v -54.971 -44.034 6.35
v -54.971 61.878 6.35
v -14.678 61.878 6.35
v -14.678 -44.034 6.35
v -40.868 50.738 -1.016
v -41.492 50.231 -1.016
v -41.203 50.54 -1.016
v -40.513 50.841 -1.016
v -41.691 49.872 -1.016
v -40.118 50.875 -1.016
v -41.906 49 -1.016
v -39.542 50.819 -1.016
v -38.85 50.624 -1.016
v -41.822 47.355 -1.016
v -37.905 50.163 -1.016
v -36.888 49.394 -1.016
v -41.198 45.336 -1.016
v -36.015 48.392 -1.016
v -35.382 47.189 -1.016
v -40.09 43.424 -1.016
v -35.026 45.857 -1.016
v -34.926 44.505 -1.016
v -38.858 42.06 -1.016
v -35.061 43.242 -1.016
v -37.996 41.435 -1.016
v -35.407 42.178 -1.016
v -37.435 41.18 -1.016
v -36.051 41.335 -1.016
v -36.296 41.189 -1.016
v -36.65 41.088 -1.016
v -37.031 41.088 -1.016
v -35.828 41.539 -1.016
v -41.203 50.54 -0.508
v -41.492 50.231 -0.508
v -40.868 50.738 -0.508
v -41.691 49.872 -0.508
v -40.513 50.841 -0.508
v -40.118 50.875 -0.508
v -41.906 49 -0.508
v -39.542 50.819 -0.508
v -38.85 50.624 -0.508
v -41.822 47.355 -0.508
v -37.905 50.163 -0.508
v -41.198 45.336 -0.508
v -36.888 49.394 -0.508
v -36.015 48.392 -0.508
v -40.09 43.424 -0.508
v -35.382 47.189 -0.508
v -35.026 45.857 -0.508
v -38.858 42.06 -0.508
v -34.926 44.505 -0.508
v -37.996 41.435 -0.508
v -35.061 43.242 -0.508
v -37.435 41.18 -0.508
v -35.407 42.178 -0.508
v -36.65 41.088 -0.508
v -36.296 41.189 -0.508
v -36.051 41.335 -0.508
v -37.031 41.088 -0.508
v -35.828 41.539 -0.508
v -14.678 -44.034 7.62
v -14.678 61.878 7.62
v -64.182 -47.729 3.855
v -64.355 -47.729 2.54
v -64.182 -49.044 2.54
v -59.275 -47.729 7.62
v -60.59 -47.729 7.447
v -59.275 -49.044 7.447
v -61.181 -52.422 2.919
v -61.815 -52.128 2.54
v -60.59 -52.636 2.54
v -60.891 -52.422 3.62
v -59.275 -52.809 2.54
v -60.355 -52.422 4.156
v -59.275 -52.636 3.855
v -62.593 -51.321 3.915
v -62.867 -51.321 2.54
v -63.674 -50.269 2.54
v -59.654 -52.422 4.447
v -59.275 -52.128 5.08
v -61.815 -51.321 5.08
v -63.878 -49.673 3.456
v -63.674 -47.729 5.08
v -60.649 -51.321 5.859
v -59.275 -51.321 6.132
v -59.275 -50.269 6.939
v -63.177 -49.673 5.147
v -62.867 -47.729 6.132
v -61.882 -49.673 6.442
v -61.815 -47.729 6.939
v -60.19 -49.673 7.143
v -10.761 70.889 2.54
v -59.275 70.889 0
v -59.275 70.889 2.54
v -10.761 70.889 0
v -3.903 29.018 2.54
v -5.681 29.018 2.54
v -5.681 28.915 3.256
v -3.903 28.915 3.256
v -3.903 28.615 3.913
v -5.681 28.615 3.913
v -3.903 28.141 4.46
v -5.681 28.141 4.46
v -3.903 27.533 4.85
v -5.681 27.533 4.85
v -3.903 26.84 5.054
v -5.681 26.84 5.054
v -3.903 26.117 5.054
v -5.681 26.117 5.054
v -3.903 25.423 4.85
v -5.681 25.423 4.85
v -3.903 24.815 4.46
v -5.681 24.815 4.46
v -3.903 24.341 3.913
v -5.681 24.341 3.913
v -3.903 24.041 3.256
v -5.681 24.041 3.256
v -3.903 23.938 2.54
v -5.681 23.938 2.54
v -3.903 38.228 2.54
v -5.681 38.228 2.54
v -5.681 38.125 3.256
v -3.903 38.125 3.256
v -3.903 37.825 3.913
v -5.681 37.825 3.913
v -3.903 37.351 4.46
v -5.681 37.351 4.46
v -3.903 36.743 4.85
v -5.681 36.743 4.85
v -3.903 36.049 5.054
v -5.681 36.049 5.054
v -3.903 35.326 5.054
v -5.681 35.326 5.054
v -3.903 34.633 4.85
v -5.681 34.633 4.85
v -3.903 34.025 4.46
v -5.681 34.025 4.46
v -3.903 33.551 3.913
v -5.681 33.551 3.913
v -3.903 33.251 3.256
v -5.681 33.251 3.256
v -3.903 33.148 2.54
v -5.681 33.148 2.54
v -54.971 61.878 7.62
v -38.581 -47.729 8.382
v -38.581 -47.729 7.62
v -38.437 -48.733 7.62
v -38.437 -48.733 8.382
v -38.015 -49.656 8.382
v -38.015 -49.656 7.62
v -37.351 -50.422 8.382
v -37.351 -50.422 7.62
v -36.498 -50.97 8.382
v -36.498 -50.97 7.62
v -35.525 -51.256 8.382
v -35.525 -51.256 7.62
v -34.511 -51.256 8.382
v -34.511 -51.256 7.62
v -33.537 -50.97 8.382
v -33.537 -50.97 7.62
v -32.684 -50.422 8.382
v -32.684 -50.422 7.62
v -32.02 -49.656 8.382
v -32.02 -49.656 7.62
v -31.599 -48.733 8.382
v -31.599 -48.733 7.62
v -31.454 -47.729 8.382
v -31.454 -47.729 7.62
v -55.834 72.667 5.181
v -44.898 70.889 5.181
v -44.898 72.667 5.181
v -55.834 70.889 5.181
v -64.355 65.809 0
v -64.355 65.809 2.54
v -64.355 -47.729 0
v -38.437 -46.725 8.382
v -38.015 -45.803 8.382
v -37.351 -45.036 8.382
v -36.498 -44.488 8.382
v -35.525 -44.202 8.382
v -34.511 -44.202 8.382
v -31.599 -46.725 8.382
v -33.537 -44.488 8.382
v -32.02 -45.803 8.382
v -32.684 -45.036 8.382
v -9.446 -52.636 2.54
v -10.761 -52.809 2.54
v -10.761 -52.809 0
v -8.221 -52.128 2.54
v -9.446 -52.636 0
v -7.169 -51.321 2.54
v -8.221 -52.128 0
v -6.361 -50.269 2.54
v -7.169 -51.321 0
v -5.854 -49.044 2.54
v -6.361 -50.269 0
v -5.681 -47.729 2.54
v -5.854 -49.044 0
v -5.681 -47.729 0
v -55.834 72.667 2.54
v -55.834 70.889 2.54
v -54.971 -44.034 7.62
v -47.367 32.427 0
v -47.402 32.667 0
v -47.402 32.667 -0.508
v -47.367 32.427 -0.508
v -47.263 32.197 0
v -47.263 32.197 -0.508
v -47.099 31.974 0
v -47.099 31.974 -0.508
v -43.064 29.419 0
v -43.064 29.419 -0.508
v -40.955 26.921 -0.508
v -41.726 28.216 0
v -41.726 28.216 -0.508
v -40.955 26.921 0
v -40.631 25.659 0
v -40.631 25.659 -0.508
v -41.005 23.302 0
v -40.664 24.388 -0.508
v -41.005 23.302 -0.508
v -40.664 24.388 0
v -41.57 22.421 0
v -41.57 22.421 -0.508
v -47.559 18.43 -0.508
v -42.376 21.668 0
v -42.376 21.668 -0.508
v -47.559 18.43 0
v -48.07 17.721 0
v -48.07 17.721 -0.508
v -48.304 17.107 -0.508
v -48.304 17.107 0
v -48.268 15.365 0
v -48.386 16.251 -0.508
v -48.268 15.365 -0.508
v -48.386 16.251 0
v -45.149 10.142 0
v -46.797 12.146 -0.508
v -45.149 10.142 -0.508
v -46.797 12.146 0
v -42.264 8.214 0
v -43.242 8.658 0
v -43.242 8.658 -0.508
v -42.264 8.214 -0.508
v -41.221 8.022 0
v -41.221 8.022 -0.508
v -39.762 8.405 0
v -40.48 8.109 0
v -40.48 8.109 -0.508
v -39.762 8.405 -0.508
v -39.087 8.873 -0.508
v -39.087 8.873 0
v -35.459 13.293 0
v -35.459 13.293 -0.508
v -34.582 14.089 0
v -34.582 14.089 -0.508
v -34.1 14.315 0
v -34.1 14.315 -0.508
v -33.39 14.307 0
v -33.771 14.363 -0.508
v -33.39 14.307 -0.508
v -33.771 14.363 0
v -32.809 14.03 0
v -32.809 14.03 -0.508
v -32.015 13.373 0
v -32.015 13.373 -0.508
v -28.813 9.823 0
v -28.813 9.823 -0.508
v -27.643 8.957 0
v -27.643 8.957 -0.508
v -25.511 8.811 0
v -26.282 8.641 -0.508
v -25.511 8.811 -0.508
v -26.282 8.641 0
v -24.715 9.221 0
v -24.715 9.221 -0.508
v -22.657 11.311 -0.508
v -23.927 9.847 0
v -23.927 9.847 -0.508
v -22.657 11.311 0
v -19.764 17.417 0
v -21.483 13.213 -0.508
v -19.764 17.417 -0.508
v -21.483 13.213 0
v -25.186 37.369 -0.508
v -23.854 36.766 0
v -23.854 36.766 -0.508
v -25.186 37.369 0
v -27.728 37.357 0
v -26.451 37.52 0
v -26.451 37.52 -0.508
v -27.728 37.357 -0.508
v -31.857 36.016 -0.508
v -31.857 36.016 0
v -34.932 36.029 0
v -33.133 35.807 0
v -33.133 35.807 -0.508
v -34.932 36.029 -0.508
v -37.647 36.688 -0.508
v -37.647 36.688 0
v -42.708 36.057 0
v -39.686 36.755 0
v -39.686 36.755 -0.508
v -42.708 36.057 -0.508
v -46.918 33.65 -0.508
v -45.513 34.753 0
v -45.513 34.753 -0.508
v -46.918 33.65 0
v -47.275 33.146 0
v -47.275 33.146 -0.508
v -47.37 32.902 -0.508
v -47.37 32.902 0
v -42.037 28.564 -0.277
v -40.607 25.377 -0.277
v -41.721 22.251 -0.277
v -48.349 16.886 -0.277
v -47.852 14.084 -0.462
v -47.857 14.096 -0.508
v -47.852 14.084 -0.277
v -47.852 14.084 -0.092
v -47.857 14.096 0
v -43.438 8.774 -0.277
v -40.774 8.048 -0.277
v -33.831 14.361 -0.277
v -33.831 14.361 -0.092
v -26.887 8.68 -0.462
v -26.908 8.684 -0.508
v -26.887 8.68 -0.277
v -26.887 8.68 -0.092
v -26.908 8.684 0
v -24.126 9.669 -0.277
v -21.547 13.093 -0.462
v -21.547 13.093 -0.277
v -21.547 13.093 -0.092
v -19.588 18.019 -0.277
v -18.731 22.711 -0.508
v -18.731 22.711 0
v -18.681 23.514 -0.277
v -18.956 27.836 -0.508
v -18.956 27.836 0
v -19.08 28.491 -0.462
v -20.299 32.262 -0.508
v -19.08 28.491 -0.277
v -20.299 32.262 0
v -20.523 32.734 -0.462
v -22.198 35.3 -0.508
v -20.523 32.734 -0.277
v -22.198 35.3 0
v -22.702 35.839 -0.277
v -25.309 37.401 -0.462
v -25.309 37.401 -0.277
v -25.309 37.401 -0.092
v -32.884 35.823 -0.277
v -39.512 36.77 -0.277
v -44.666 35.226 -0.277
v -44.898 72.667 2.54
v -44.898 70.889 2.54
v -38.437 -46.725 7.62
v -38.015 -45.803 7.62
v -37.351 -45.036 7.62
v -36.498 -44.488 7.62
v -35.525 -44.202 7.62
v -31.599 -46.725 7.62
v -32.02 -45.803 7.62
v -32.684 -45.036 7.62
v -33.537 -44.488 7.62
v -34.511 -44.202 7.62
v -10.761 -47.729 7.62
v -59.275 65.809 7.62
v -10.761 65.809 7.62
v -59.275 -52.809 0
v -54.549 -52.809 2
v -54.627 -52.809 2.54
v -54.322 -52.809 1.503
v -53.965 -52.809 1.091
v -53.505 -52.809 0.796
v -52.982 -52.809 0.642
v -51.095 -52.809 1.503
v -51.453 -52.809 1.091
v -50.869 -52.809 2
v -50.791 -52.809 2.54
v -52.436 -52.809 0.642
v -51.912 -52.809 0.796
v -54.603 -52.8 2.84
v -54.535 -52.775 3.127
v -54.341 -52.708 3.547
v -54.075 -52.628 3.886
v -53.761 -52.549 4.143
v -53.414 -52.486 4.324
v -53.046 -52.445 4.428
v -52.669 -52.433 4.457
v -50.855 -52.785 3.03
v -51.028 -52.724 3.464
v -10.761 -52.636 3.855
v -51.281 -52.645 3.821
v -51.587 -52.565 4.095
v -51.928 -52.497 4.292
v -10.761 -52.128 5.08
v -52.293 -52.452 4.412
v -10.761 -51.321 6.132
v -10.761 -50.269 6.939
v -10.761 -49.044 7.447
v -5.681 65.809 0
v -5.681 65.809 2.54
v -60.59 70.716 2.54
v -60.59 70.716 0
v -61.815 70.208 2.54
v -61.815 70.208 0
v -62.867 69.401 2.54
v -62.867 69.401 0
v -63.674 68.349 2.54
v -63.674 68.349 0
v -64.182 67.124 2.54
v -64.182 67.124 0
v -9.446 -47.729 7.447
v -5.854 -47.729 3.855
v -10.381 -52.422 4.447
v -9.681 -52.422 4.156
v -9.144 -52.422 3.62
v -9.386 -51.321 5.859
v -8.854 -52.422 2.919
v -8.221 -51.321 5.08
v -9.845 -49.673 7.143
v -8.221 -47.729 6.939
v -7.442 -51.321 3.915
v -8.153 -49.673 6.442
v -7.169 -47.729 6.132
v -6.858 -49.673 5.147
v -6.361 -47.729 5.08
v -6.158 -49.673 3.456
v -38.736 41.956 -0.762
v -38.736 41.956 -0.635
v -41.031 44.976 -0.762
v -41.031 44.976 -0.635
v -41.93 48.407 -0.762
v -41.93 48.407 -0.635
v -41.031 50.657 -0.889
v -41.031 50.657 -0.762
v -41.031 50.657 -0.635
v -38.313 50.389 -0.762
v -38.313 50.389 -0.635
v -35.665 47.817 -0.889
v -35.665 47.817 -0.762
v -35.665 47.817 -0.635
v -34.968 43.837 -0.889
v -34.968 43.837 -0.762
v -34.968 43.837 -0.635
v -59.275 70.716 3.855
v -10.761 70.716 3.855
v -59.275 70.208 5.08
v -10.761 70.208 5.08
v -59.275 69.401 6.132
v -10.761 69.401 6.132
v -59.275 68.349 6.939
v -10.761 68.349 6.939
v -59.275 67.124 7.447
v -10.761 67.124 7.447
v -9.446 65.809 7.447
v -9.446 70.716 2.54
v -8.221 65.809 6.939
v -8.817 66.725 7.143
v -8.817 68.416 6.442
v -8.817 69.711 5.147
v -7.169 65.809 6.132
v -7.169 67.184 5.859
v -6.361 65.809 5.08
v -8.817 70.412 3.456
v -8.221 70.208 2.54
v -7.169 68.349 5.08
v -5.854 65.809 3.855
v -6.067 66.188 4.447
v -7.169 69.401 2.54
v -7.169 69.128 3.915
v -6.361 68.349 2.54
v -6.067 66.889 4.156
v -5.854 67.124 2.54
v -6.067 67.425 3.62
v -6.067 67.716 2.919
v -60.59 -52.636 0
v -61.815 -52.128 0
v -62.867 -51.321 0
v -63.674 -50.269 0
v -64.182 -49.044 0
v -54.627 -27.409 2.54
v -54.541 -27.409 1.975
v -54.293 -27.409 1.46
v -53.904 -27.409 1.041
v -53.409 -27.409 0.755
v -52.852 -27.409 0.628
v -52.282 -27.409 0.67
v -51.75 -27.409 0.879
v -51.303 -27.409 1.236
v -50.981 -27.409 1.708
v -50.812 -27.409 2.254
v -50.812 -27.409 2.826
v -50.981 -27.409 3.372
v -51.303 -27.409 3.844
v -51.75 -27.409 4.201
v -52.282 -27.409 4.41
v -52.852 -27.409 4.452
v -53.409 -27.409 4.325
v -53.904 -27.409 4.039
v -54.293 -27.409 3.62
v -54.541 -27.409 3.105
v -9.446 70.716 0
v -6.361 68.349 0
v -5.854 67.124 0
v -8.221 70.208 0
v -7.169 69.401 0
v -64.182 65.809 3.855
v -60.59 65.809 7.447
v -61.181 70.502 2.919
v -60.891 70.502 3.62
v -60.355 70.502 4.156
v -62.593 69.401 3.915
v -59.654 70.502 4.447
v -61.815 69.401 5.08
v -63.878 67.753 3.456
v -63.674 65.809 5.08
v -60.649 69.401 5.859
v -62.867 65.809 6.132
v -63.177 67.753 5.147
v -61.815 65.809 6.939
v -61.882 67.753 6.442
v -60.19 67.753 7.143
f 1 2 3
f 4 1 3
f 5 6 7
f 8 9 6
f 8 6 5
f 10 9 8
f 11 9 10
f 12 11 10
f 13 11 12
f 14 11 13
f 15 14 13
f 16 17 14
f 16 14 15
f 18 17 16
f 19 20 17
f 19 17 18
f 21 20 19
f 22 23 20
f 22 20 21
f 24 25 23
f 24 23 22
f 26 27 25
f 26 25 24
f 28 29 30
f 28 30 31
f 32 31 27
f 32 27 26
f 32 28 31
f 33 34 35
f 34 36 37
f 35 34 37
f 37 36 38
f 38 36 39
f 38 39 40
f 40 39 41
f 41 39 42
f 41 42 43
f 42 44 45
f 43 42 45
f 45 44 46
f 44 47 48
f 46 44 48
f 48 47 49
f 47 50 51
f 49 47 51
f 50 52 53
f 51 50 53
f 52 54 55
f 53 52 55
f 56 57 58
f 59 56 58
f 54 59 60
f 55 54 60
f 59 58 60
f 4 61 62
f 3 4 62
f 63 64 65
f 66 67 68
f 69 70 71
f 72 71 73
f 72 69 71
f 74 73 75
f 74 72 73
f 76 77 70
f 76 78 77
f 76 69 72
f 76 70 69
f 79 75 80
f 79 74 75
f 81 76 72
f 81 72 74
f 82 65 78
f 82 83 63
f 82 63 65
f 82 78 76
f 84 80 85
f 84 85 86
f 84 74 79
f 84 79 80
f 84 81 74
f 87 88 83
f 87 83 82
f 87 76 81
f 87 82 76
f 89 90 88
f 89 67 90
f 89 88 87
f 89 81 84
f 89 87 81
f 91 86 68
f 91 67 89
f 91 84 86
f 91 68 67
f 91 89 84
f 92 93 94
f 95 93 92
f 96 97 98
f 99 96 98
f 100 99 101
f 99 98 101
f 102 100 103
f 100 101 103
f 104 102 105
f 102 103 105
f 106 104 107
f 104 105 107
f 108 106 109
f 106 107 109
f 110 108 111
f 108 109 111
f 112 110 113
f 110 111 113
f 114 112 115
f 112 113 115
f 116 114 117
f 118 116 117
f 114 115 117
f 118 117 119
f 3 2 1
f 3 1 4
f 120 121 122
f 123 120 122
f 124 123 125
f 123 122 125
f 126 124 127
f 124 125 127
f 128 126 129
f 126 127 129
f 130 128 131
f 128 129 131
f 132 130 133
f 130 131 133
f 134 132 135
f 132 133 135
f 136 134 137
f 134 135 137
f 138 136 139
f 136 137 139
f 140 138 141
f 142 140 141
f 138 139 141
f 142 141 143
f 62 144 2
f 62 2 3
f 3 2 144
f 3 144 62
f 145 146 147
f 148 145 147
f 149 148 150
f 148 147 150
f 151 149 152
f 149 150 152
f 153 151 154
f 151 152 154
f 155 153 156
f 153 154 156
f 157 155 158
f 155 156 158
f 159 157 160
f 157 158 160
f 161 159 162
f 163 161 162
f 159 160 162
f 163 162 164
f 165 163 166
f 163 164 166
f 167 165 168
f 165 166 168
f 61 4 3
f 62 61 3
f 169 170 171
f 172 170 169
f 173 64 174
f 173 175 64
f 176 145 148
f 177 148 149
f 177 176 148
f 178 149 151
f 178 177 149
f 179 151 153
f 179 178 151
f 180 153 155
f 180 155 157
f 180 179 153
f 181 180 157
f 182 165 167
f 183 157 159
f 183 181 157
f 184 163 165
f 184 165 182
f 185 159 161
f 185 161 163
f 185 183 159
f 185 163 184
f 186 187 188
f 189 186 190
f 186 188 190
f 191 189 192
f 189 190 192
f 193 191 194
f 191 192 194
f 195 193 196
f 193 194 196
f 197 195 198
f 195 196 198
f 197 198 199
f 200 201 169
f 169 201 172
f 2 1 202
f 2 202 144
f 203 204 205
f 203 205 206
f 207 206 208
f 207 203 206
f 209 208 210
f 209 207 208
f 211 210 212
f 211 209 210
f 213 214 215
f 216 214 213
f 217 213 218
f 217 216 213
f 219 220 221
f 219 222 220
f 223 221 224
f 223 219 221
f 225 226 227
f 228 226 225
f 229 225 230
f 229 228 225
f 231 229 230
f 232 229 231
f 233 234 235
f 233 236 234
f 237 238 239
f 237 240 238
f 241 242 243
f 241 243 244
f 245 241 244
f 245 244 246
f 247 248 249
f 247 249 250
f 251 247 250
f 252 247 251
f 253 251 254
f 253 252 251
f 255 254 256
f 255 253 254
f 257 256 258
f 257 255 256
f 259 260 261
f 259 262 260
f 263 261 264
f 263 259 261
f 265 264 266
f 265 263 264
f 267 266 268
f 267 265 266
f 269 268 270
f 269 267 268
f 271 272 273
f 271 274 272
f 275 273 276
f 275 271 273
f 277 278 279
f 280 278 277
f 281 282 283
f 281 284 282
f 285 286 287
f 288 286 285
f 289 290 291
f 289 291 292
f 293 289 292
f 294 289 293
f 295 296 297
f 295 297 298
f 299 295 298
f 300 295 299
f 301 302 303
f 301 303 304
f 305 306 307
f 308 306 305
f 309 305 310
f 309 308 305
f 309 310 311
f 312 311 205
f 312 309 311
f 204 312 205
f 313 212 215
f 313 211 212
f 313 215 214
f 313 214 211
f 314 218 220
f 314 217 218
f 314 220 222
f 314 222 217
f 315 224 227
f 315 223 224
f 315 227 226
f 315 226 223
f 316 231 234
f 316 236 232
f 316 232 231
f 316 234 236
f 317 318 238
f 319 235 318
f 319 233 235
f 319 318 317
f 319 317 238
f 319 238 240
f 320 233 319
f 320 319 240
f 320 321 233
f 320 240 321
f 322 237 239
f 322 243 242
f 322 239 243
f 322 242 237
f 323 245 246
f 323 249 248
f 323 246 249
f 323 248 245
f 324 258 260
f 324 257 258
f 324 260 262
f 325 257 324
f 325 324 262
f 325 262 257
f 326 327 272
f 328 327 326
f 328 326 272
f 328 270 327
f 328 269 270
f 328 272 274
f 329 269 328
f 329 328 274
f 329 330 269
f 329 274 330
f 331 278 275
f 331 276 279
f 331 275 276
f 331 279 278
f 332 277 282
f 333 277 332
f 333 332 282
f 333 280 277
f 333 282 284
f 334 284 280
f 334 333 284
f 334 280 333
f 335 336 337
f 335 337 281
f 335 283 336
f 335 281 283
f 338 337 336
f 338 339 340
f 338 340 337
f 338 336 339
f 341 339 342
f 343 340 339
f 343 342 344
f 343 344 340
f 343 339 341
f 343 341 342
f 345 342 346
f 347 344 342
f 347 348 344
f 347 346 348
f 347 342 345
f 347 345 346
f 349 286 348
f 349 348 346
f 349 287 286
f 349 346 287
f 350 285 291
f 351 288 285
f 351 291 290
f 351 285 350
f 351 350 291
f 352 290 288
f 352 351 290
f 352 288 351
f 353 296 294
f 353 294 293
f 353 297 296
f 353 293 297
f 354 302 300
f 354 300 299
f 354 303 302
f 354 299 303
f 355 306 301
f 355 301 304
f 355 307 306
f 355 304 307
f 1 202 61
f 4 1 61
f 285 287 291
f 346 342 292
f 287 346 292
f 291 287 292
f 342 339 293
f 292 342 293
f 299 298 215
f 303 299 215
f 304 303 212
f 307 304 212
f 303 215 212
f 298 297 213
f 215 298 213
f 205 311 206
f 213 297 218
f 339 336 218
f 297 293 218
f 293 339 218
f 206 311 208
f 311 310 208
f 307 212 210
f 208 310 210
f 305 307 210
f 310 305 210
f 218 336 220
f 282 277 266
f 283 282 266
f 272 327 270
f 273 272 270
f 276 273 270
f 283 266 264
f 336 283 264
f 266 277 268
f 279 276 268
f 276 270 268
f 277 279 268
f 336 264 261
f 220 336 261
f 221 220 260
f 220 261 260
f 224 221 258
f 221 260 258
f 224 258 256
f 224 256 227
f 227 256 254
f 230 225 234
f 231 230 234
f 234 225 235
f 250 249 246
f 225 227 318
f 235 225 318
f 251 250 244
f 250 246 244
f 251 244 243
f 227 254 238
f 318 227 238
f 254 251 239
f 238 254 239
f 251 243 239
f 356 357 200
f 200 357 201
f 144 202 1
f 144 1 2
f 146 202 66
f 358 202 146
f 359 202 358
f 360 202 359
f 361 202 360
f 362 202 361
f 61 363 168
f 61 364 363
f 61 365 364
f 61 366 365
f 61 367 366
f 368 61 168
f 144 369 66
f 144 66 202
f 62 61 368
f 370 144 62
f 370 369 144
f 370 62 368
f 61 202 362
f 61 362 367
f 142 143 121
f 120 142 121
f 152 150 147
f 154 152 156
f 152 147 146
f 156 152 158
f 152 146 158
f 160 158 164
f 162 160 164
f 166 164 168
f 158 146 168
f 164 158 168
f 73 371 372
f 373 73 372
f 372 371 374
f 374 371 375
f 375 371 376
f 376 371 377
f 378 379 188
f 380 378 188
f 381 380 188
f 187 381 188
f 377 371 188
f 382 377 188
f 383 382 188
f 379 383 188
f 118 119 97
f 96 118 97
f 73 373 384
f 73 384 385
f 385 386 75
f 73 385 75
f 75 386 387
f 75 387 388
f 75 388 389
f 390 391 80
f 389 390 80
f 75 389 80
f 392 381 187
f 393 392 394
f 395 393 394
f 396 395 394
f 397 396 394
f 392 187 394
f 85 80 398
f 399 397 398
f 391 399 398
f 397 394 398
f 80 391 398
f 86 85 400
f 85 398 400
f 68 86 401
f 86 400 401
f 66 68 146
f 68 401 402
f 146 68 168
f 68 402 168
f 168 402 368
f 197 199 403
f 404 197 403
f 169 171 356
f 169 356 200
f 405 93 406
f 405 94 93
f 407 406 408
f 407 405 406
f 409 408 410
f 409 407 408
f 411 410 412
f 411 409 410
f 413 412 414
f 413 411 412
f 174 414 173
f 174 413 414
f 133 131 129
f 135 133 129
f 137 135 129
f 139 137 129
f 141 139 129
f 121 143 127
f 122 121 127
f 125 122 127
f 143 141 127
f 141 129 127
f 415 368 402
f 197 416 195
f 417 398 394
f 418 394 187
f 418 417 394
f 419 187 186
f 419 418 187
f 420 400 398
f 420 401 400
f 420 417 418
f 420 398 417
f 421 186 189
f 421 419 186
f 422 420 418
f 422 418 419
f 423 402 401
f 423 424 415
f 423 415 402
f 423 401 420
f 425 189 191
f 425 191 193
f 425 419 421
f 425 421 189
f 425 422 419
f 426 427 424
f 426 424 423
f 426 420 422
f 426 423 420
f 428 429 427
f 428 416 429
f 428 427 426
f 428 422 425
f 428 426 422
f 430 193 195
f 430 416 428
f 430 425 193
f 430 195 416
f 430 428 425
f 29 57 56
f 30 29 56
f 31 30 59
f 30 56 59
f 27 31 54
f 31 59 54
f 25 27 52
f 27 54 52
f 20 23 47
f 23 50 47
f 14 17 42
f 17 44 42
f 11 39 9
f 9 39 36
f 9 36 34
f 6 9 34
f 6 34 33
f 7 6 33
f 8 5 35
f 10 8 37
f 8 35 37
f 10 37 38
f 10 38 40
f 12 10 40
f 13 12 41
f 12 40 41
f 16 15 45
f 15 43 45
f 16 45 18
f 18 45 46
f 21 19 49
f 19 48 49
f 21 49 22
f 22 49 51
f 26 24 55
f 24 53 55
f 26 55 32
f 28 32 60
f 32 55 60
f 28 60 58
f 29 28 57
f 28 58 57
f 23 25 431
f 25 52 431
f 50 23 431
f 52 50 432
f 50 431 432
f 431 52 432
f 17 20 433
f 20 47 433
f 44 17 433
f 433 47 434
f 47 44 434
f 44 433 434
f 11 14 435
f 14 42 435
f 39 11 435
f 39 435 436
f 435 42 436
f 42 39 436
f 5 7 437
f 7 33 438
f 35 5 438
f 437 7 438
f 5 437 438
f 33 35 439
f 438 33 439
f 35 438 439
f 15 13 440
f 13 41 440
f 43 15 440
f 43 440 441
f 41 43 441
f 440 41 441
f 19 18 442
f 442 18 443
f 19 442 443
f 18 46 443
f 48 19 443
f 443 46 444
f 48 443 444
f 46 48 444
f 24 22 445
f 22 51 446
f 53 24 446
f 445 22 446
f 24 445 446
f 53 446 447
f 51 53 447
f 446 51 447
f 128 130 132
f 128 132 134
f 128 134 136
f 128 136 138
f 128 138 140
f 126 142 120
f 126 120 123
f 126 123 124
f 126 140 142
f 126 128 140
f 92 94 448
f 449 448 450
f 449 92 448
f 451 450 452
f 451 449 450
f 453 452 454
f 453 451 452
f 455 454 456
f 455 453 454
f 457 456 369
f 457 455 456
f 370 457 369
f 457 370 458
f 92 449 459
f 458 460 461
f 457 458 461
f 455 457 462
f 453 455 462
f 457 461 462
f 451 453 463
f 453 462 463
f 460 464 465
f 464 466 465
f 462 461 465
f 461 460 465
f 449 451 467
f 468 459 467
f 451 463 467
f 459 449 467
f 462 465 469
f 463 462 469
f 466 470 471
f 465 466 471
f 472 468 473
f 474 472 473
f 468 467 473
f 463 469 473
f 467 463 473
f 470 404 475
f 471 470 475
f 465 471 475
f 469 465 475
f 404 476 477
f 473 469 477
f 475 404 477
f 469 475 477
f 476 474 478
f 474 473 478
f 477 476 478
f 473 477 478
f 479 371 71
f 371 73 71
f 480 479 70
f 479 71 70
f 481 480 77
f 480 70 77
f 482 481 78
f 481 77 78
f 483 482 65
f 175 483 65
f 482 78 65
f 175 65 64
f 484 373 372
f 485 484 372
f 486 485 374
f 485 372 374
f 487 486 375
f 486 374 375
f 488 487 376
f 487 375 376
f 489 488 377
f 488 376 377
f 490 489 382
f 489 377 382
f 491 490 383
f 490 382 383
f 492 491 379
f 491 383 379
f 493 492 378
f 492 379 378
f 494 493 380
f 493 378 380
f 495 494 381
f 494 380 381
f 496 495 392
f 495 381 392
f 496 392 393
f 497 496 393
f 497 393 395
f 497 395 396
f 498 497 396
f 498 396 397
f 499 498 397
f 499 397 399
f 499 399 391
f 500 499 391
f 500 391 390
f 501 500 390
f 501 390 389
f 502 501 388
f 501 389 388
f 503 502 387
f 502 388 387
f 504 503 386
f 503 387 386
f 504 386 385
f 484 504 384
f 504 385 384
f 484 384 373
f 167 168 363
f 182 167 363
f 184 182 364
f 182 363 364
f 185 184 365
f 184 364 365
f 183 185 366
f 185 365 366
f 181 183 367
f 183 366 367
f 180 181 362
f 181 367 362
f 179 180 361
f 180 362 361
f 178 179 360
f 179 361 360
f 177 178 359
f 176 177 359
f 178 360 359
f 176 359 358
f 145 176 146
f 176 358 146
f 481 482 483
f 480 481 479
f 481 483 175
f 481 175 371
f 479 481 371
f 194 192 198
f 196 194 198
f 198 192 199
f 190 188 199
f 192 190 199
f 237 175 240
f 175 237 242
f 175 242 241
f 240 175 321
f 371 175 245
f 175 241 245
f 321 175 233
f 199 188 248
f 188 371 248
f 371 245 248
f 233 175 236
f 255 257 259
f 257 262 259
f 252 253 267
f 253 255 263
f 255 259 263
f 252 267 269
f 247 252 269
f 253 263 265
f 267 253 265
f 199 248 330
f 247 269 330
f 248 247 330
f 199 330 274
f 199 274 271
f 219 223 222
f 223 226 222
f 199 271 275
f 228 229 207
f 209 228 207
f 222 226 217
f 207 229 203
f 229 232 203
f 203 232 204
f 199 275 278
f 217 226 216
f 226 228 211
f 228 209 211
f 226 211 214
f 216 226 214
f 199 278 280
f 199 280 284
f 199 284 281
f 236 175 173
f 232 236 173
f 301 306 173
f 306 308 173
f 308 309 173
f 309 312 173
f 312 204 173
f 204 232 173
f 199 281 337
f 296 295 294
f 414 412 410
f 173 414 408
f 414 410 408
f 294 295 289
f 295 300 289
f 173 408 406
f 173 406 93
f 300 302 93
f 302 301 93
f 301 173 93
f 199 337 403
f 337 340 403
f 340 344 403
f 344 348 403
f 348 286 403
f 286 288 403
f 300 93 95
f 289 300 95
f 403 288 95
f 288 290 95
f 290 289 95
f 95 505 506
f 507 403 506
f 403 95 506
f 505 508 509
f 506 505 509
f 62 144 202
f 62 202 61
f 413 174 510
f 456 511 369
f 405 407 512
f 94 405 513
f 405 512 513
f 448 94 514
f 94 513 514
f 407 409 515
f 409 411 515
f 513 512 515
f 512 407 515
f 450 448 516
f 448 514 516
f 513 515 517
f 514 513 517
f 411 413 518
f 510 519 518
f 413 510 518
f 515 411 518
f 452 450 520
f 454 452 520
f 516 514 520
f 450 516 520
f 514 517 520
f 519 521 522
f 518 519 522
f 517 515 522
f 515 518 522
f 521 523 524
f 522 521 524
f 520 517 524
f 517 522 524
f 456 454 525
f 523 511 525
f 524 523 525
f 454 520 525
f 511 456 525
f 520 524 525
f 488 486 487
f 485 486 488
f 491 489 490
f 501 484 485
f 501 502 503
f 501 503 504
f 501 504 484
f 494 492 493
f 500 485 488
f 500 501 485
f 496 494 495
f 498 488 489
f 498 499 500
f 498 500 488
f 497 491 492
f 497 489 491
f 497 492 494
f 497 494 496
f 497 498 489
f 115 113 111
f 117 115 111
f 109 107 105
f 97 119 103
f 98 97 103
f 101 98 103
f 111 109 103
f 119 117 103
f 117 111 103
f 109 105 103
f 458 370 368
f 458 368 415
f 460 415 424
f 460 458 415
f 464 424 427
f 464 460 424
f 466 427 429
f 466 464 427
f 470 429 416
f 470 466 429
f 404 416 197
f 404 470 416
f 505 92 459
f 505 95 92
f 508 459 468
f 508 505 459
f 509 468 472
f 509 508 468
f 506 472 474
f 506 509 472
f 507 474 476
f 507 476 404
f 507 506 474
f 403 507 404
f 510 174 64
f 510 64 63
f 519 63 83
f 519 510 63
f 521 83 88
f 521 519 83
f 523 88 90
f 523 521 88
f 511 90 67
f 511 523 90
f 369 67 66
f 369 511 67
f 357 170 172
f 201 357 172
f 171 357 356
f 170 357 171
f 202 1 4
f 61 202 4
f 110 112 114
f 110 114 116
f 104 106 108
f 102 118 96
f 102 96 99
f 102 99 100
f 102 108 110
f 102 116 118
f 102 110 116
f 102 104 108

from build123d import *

# Parameters (mm, degrees)
F0_W      = 58.674
F0_H      = 123.698
F1_DEPTH  = 7.62
F2_R      = 5.08
F3_R      = 5.08
F4_R      = 5.08
F5_R      = 5.08
F6_W      = 40.2928031981
F6_H      = 105.9125214815
F7_DEPTH  = 1.27
F8_W      = 40.2928031981
F8_H      = 105.9125214815
F9_DEPTH  = 1.27
F13_DEPTH = 1.778
F12_W     = 10.936614126
F12_H     = 2.6405032417
F14_DEPTH = 1.778
F16_DEPTH = 1.778
F17_DEPTH = 0.762
F19_DEPTH = 0.508
F21_DEPTH = 0.508
F23_DEPTH = 25.4


with BuildPart() as f1:
    # F0 (on Top) → F1 (new body)
    with BuildSketch(Plane.XY):
        with Locations((-35.0177383424, 9.0399411573)):
            Rectangle(F0_W, F0_H)
    extrude(amount=F1_DEPTH)

    # F2
    f2_edges = [f1.edges().sort_by_distance(p)[0] for p in [
        (-64.354738, 9.039941, 7.62),
    ]]
    fillet(f2_edges, radius=F2_R)

    # F3
    f3_edges = [f1.edges().sort_by_distance(p)[0] for p in [
        (-32.477738, 70.888941, 7.62),
    ]]
    fillet(f3_edges, radius=F3_R)

    # F4
    f4_edges = [f1.edges().sort_by_distance(p)[0] for p in [
        (-5.680738, 6.499941, 7.62),
    ]]
    fillet(f4_edges, radius=F4_R)

    # F5
    f5_edges = [f1.edges().sort_by_distance(p)[0] for p in [
        (-35.017738, -52.809059, 7.62),
    ]]
    fillet(f5_edges, radius=F5_R)

    # F6 (on face) → F7 (cut)
    with BuildSketch(Plane.XY.offset(7.62)):
        with Locations((-34.8244961351, 8.9219771326)):
            Rectangle(F6_W, F6_H)
    extrude(amount=-F7_DEPTH, mode=Mode.SUBTRACT)

    # F15 (on face) → F17 (join)
    with BuildSketch(Plane.XY.offset(7.62)):
        with BuildLine():
            ThreePointArc((-38.5811812844, -47.7290588427), (-35.0177383424, -51.2925017847), (-31.4542954004, -47.7290588427))
            Line((-31.4542954004, -47.7290588427), (-38.5811812844, -47.7290588427))
        make_face()
        with BuildLine():
            Line((-38.5811812844, -47.7290588427), (-31.4542954004, -47.7290588427))
            ThreePointArc((-31.4542954004, -47.7290588427), (-35.0177383424, -44.1656159008), (-38.5811812844, -47.7290588427))
        make_face()
    extrude(amount=F17_DEPTH)

    # F18 (on face) → F19 (join)
    with BuildSketch(Plane(origin=(0, 0, 0), x_dir=(1, 0, 0), z_dir=(0, 0, -1))):
        with BuildLine():
            add(Edge.make_bspline(
                [(-47.4022328854, -32.6668061316), (-47.4039454411, -31.2855552534), (-40.4425272484, -29.6151679359), (-39.9021285325, -20.7658551572), (-52.9334982886, -18.9159938423), (-39.8436082704, -2.0710260589), (-34.1084299608, -19.8718751113), (-26.3908858564, -1.9511775764), (-14.9153701039, -24.0937892291), (-24.0258697055, -40.8267238563), (-33.1529012898, -34.1829091107), (-38.6908181577, -38.5205402908), (-47.4002677908, -34.2517405467), (-47.4022328854, -32.6668061316)],
                knots=[0, 0, 0, 0, 0.076676808, 0.1508477257, 0.2370022983, 0.3376566061, 0.4280341834, 0.5164032829, 0.6378774884, 0.7536098802, 0.8356764376, 0.9120161922, 1, 1, 1, 1], degree=3))
        make_face()
    extrude(amount=F19_DEPTH)

    # F22 (on face) → F23 (cut)
    with BuildSketch(Plane.XZ.offset(52.8090588427)):
        with BuildLine():
            Line((-54.626502028, 2.54), (-50.7910103292, 2.54))
            ThreePointArc((-50.7910103292, 2.54), (-52.7087561786, 4.4577458494), (-54.626502028, 2.54))
        make_face()
        with BuildLine():
            ThreePointArc((-54.626502028, 2.54), (-52.7087561786, 0.6222541506), (-50.7910103292, 2.54))
            Line((-50.7910103292, 2.54), (-54.626502028, 2.54))
        make_face()
    extrude(amount=-F23_DEPTH, mode=Mode.SUBTRACT)


with BuildPart() as f9:
    # F8 (on face) → F9 (new body)
    with BuildSketch(Plane.XY.offset(6.35)):
        with Locations((-34.8244961351, 8.9219771326)):
            Rectangle(F8_W, F8_H)
    extrude(amount=F9_DEPTH)


with BuildPart() as f13:
    # F11 (on face) → F13 (new body)
    with BuildSketch(Plane.YZ.offset(-5.6807383424)):
        with BuildLine():
            Line((23.9381285077, 2.54), (29.0181285077, 2.54))
            ThreePointArc((29.0181285077, 2.54), (26.4781285077, 5.08), (23.9381285077, 2.54))
        make_face()
    extrude(amount=F13_DEPTH)


with BuildPart() as f14:
    # F12 (on face) → F14 (new body)
    with BuildSketch(Plane(origin=(0, 70.8889411573, 0), x_dir=(-1, 0, 0), z_dir=(0, 1, 0))):
        with Locations((50.3660049289, 3.8602516209)):
            Rectangle(F12_W, F12_H)
    extrude(amount=F14_DEPTH)


with BuildPart() as f16:
    # F10 (on face) → F16 (new body)
    with BuildSketch(Plane.YZ.offset(-5.6807383424)):
        with BuildLine():
            Line((33.1479159808, 2.54), (38.2279159808, 2.54))
            ThreePointArc((38.2279159808, 2.54), (35.6879159808, 5.08), (33.1479159808, 2.54))
        make_face()
    extrude(amount=F16_DEPTH)


with BuildPart() as f21:
    # F20 (on face) → F21 (new body)
    with BuildSketch(Plane(origin=(0, 0, -0.508), x_dir=(1, 0, 0), z_dir=(0, 0, -1))):
        with BuildLine():
            add(Edge.make_bspline(
                [(-36.2964496017, -41.188582778), (-37.6547848521, -40.5684336535), (-42.0076645606, -44.5532276834), (-42.4530510913, -52.6559515619), (-33.9225672026, -48.7870567461), (-34.8730055186, -41.8384573959), (-36.2964496017, -41.188582778)],
                knots=[0, 0, 0, 0, 0.2489655368, 0.4899667149, 0.7391008442, 1, 1, 1, 1], degree=3))
        make_face()
    extrude(amount=F21_DEPTH)


solid = Compound([f1.part, f9.part, f13.part, f14.part, f16.part, f21.part])
